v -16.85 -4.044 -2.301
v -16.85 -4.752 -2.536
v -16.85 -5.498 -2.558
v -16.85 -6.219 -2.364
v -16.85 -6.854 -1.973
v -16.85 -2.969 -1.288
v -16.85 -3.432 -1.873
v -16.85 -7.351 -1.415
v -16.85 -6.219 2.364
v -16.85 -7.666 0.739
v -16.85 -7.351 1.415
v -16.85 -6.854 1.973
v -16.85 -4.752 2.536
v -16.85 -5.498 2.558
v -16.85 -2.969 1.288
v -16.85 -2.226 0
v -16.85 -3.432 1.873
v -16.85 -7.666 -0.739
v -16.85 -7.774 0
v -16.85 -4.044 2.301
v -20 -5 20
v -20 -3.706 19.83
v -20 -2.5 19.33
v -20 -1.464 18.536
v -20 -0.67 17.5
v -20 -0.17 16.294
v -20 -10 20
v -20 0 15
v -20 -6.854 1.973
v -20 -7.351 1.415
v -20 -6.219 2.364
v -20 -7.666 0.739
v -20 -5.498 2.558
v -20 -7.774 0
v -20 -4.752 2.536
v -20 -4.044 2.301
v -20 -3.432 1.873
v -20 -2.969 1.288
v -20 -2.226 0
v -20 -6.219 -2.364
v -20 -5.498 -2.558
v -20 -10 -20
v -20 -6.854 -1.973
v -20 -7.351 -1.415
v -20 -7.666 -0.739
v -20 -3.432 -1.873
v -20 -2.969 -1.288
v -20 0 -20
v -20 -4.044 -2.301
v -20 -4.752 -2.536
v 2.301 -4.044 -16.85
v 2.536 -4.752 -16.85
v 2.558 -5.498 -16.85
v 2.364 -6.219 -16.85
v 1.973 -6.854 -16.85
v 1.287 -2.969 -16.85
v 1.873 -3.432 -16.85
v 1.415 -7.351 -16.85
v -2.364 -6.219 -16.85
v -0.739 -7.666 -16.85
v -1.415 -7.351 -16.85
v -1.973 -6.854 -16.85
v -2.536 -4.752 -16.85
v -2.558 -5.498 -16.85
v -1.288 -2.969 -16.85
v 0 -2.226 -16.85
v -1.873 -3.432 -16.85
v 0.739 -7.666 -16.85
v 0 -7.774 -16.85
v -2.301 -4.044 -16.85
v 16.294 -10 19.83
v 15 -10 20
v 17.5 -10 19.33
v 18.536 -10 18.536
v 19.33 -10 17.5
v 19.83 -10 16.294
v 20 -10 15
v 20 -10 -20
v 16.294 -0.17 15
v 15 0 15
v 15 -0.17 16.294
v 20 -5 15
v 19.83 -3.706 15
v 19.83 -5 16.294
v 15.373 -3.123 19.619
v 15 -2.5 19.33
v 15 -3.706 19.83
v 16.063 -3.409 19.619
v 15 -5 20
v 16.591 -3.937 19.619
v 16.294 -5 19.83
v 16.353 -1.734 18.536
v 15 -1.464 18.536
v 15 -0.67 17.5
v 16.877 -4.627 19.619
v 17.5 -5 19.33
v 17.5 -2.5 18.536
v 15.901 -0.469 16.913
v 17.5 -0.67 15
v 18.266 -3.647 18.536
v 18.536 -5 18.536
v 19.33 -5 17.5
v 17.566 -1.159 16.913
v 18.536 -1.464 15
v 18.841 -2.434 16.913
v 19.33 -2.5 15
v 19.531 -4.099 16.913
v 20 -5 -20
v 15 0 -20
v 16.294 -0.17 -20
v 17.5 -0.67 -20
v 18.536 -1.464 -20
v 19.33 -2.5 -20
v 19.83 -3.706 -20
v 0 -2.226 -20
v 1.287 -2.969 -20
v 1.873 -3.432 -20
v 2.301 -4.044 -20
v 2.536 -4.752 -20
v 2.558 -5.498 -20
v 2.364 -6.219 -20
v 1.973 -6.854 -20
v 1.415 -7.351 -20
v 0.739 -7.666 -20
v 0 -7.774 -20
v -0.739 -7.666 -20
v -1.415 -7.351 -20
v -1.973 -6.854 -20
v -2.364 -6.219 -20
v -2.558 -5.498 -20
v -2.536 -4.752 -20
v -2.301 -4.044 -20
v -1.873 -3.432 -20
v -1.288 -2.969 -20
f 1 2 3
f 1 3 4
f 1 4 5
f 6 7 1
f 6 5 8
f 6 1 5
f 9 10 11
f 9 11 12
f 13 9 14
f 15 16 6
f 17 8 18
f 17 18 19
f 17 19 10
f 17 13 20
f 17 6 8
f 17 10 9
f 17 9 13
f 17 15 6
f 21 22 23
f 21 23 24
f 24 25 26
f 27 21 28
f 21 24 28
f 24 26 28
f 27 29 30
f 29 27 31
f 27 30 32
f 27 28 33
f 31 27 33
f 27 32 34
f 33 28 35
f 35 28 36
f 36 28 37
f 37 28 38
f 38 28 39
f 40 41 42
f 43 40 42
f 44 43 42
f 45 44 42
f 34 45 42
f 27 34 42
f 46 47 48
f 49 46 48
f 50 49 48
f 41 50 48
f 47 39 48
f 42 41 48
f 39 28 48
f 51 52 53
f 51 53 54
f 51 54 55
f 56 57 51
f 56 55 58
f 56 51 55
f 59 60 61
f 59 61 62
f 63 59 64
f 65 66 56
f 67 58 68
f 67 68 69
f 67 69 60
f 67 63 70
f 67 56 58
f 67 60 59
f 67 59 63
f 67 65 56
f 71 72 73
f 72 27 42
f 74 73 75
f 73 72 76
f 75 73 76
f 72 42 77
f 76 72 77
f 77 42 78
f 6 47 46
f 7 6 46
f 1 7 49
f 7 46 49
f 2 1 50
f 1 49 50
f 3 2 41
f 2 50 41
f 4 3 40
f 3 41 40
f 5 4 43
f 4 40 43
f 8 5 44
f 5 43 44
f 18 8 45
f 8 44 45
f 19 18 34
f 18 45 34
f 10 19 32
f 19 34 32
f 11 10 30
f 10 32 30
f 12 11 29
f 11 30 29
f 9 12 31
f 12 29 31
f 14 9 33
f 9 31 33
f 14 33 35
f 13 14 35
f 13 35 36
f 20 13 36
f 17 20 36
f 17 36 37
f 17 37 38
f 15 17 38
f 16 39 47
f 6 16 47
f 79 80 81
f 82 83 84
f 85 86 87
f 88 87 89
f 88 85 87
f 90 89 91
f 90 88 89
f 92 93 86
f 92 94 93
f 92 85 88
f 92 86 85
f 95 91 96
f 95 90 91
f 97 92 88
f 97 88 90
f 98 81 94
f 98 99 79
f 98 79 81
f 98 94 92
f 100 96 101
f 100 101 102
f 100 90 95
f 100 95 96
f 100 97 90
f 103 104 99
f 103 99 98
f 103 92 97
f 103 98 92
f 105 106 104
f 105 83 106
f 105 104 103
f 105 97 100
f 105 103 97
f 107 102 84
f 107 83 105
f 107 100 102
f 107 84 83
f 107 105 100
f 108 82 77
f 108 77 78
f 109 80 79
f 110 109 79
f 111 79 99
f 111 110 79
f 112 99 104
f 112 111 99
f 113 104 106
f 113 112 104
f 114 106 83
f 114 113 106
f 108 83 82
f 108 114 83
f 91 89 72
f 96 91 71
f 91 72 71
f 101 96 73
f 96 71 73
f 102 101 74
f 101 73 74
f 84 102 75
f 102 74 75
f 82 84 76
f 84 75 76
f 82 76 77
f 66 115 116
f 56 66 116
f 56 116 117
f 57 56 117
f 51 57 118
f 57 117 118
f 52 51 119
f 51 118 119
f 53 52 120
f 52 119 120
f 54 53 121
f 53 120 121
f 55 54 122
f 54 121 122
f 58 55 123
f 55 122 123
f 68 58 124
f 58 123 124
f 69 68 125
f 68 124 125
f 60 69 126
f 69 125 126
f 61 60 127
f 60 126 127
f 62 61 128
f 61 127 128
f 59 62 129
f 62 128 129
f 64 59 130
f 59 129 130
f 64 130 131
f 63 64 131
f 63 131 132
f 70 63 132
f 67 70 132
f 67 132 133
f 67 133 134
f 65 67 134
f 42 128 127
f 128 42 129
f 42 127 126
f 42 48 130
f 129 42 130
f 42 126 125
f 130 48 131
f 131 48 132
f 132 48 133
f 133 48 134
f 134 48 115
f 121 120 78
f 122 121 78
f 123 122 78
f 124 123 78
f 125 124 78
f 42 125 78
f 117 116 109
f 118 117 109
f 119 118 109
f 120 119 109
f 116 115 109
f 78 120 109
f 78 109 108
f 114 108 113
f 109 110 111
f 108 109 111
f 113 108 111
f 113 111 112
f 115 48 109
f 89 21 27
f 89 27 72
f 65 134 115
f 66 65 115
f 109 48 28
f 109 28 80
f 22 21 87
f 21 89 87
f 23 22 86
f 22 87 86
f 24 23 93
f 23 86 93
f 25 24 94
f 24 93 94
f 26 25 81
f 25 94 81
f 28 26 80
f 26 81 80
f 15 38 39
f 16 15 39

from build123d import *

# Parameters (mm, degrees)
SKETCH_1_W               = 40
SKETCH_1_H               = 40
EXTRUDE_1_DEPTH          = 10
SKETCH_7_R               = 2.575
CUT_EXTRUDE_2_DEPTH      = 3.15
PATTERN_CIRCULAR_1_COUNT = 2
PATTERN_CIRCULAR_1_ANGLE = 90
FILLET_2_R               = 5


with BuildPart() as part:
    # Эскиз1 → Бобышка-Вытянуть1 (new body)
    with BuildSketch(Plane(origin=(0, 0, 0), x_dir=(1, 0, 0), z_dir=(0, 1, 0))):
        Rectangle(SKETCH_1_W, SKETCH_1_H)
    extrude(amount=-EXTRUDE_1_DEPTH)

    # Эскиз7 → Вырез-Вытянуть2 (cut)
    with BuildSketch(Plane.ZY.offset(20)):
        with Locations((0, -5.199176943)):
            Circle(SKETCH_7_R)
        with BuildLine():
            Line((1.2875, -2.969161528), (0, -2.225823057))
            Line((0, -2.225823057), (-1.2875, -2.969161528))
            ThreePointArc((-1.2875, -2.969161528), (0, -2.624176943), (1.2875, -2.969161528))
        make_face()
    cut_extrude_2 = extrude(amount=-CUT_EXTRUDE_2_DEPTH, mode=Mode.SUBTRACT)

    # Круговой массив1: Вырез-Вытянуть2 ×2 about axis
    pattern_circular_1_axis = Axis((0, -10, 0), (0, -1, 0))
    for i in range(1, PATTERN_CIRCULAR_1_COUNT):
        add(cut_extrude_2.rotate(pattern_circular_1_axis, i * PATTERN_CIRCULAR_1_ANGLE / (PATTERN_CIRCULAR_1_COUNT - 1)), mode=Mode.SUBTRACT)

    # Скругление2
    fillet_2_edges = [part.edges().sort_by_distance(p)[0] for p in [
        (20, 0, 0),
        (0, 0, 20),
        (20, -5, 20),
    ]]
    fillet(fillet_2_edges, radius=FILLET_2_R)


solid = part.part
